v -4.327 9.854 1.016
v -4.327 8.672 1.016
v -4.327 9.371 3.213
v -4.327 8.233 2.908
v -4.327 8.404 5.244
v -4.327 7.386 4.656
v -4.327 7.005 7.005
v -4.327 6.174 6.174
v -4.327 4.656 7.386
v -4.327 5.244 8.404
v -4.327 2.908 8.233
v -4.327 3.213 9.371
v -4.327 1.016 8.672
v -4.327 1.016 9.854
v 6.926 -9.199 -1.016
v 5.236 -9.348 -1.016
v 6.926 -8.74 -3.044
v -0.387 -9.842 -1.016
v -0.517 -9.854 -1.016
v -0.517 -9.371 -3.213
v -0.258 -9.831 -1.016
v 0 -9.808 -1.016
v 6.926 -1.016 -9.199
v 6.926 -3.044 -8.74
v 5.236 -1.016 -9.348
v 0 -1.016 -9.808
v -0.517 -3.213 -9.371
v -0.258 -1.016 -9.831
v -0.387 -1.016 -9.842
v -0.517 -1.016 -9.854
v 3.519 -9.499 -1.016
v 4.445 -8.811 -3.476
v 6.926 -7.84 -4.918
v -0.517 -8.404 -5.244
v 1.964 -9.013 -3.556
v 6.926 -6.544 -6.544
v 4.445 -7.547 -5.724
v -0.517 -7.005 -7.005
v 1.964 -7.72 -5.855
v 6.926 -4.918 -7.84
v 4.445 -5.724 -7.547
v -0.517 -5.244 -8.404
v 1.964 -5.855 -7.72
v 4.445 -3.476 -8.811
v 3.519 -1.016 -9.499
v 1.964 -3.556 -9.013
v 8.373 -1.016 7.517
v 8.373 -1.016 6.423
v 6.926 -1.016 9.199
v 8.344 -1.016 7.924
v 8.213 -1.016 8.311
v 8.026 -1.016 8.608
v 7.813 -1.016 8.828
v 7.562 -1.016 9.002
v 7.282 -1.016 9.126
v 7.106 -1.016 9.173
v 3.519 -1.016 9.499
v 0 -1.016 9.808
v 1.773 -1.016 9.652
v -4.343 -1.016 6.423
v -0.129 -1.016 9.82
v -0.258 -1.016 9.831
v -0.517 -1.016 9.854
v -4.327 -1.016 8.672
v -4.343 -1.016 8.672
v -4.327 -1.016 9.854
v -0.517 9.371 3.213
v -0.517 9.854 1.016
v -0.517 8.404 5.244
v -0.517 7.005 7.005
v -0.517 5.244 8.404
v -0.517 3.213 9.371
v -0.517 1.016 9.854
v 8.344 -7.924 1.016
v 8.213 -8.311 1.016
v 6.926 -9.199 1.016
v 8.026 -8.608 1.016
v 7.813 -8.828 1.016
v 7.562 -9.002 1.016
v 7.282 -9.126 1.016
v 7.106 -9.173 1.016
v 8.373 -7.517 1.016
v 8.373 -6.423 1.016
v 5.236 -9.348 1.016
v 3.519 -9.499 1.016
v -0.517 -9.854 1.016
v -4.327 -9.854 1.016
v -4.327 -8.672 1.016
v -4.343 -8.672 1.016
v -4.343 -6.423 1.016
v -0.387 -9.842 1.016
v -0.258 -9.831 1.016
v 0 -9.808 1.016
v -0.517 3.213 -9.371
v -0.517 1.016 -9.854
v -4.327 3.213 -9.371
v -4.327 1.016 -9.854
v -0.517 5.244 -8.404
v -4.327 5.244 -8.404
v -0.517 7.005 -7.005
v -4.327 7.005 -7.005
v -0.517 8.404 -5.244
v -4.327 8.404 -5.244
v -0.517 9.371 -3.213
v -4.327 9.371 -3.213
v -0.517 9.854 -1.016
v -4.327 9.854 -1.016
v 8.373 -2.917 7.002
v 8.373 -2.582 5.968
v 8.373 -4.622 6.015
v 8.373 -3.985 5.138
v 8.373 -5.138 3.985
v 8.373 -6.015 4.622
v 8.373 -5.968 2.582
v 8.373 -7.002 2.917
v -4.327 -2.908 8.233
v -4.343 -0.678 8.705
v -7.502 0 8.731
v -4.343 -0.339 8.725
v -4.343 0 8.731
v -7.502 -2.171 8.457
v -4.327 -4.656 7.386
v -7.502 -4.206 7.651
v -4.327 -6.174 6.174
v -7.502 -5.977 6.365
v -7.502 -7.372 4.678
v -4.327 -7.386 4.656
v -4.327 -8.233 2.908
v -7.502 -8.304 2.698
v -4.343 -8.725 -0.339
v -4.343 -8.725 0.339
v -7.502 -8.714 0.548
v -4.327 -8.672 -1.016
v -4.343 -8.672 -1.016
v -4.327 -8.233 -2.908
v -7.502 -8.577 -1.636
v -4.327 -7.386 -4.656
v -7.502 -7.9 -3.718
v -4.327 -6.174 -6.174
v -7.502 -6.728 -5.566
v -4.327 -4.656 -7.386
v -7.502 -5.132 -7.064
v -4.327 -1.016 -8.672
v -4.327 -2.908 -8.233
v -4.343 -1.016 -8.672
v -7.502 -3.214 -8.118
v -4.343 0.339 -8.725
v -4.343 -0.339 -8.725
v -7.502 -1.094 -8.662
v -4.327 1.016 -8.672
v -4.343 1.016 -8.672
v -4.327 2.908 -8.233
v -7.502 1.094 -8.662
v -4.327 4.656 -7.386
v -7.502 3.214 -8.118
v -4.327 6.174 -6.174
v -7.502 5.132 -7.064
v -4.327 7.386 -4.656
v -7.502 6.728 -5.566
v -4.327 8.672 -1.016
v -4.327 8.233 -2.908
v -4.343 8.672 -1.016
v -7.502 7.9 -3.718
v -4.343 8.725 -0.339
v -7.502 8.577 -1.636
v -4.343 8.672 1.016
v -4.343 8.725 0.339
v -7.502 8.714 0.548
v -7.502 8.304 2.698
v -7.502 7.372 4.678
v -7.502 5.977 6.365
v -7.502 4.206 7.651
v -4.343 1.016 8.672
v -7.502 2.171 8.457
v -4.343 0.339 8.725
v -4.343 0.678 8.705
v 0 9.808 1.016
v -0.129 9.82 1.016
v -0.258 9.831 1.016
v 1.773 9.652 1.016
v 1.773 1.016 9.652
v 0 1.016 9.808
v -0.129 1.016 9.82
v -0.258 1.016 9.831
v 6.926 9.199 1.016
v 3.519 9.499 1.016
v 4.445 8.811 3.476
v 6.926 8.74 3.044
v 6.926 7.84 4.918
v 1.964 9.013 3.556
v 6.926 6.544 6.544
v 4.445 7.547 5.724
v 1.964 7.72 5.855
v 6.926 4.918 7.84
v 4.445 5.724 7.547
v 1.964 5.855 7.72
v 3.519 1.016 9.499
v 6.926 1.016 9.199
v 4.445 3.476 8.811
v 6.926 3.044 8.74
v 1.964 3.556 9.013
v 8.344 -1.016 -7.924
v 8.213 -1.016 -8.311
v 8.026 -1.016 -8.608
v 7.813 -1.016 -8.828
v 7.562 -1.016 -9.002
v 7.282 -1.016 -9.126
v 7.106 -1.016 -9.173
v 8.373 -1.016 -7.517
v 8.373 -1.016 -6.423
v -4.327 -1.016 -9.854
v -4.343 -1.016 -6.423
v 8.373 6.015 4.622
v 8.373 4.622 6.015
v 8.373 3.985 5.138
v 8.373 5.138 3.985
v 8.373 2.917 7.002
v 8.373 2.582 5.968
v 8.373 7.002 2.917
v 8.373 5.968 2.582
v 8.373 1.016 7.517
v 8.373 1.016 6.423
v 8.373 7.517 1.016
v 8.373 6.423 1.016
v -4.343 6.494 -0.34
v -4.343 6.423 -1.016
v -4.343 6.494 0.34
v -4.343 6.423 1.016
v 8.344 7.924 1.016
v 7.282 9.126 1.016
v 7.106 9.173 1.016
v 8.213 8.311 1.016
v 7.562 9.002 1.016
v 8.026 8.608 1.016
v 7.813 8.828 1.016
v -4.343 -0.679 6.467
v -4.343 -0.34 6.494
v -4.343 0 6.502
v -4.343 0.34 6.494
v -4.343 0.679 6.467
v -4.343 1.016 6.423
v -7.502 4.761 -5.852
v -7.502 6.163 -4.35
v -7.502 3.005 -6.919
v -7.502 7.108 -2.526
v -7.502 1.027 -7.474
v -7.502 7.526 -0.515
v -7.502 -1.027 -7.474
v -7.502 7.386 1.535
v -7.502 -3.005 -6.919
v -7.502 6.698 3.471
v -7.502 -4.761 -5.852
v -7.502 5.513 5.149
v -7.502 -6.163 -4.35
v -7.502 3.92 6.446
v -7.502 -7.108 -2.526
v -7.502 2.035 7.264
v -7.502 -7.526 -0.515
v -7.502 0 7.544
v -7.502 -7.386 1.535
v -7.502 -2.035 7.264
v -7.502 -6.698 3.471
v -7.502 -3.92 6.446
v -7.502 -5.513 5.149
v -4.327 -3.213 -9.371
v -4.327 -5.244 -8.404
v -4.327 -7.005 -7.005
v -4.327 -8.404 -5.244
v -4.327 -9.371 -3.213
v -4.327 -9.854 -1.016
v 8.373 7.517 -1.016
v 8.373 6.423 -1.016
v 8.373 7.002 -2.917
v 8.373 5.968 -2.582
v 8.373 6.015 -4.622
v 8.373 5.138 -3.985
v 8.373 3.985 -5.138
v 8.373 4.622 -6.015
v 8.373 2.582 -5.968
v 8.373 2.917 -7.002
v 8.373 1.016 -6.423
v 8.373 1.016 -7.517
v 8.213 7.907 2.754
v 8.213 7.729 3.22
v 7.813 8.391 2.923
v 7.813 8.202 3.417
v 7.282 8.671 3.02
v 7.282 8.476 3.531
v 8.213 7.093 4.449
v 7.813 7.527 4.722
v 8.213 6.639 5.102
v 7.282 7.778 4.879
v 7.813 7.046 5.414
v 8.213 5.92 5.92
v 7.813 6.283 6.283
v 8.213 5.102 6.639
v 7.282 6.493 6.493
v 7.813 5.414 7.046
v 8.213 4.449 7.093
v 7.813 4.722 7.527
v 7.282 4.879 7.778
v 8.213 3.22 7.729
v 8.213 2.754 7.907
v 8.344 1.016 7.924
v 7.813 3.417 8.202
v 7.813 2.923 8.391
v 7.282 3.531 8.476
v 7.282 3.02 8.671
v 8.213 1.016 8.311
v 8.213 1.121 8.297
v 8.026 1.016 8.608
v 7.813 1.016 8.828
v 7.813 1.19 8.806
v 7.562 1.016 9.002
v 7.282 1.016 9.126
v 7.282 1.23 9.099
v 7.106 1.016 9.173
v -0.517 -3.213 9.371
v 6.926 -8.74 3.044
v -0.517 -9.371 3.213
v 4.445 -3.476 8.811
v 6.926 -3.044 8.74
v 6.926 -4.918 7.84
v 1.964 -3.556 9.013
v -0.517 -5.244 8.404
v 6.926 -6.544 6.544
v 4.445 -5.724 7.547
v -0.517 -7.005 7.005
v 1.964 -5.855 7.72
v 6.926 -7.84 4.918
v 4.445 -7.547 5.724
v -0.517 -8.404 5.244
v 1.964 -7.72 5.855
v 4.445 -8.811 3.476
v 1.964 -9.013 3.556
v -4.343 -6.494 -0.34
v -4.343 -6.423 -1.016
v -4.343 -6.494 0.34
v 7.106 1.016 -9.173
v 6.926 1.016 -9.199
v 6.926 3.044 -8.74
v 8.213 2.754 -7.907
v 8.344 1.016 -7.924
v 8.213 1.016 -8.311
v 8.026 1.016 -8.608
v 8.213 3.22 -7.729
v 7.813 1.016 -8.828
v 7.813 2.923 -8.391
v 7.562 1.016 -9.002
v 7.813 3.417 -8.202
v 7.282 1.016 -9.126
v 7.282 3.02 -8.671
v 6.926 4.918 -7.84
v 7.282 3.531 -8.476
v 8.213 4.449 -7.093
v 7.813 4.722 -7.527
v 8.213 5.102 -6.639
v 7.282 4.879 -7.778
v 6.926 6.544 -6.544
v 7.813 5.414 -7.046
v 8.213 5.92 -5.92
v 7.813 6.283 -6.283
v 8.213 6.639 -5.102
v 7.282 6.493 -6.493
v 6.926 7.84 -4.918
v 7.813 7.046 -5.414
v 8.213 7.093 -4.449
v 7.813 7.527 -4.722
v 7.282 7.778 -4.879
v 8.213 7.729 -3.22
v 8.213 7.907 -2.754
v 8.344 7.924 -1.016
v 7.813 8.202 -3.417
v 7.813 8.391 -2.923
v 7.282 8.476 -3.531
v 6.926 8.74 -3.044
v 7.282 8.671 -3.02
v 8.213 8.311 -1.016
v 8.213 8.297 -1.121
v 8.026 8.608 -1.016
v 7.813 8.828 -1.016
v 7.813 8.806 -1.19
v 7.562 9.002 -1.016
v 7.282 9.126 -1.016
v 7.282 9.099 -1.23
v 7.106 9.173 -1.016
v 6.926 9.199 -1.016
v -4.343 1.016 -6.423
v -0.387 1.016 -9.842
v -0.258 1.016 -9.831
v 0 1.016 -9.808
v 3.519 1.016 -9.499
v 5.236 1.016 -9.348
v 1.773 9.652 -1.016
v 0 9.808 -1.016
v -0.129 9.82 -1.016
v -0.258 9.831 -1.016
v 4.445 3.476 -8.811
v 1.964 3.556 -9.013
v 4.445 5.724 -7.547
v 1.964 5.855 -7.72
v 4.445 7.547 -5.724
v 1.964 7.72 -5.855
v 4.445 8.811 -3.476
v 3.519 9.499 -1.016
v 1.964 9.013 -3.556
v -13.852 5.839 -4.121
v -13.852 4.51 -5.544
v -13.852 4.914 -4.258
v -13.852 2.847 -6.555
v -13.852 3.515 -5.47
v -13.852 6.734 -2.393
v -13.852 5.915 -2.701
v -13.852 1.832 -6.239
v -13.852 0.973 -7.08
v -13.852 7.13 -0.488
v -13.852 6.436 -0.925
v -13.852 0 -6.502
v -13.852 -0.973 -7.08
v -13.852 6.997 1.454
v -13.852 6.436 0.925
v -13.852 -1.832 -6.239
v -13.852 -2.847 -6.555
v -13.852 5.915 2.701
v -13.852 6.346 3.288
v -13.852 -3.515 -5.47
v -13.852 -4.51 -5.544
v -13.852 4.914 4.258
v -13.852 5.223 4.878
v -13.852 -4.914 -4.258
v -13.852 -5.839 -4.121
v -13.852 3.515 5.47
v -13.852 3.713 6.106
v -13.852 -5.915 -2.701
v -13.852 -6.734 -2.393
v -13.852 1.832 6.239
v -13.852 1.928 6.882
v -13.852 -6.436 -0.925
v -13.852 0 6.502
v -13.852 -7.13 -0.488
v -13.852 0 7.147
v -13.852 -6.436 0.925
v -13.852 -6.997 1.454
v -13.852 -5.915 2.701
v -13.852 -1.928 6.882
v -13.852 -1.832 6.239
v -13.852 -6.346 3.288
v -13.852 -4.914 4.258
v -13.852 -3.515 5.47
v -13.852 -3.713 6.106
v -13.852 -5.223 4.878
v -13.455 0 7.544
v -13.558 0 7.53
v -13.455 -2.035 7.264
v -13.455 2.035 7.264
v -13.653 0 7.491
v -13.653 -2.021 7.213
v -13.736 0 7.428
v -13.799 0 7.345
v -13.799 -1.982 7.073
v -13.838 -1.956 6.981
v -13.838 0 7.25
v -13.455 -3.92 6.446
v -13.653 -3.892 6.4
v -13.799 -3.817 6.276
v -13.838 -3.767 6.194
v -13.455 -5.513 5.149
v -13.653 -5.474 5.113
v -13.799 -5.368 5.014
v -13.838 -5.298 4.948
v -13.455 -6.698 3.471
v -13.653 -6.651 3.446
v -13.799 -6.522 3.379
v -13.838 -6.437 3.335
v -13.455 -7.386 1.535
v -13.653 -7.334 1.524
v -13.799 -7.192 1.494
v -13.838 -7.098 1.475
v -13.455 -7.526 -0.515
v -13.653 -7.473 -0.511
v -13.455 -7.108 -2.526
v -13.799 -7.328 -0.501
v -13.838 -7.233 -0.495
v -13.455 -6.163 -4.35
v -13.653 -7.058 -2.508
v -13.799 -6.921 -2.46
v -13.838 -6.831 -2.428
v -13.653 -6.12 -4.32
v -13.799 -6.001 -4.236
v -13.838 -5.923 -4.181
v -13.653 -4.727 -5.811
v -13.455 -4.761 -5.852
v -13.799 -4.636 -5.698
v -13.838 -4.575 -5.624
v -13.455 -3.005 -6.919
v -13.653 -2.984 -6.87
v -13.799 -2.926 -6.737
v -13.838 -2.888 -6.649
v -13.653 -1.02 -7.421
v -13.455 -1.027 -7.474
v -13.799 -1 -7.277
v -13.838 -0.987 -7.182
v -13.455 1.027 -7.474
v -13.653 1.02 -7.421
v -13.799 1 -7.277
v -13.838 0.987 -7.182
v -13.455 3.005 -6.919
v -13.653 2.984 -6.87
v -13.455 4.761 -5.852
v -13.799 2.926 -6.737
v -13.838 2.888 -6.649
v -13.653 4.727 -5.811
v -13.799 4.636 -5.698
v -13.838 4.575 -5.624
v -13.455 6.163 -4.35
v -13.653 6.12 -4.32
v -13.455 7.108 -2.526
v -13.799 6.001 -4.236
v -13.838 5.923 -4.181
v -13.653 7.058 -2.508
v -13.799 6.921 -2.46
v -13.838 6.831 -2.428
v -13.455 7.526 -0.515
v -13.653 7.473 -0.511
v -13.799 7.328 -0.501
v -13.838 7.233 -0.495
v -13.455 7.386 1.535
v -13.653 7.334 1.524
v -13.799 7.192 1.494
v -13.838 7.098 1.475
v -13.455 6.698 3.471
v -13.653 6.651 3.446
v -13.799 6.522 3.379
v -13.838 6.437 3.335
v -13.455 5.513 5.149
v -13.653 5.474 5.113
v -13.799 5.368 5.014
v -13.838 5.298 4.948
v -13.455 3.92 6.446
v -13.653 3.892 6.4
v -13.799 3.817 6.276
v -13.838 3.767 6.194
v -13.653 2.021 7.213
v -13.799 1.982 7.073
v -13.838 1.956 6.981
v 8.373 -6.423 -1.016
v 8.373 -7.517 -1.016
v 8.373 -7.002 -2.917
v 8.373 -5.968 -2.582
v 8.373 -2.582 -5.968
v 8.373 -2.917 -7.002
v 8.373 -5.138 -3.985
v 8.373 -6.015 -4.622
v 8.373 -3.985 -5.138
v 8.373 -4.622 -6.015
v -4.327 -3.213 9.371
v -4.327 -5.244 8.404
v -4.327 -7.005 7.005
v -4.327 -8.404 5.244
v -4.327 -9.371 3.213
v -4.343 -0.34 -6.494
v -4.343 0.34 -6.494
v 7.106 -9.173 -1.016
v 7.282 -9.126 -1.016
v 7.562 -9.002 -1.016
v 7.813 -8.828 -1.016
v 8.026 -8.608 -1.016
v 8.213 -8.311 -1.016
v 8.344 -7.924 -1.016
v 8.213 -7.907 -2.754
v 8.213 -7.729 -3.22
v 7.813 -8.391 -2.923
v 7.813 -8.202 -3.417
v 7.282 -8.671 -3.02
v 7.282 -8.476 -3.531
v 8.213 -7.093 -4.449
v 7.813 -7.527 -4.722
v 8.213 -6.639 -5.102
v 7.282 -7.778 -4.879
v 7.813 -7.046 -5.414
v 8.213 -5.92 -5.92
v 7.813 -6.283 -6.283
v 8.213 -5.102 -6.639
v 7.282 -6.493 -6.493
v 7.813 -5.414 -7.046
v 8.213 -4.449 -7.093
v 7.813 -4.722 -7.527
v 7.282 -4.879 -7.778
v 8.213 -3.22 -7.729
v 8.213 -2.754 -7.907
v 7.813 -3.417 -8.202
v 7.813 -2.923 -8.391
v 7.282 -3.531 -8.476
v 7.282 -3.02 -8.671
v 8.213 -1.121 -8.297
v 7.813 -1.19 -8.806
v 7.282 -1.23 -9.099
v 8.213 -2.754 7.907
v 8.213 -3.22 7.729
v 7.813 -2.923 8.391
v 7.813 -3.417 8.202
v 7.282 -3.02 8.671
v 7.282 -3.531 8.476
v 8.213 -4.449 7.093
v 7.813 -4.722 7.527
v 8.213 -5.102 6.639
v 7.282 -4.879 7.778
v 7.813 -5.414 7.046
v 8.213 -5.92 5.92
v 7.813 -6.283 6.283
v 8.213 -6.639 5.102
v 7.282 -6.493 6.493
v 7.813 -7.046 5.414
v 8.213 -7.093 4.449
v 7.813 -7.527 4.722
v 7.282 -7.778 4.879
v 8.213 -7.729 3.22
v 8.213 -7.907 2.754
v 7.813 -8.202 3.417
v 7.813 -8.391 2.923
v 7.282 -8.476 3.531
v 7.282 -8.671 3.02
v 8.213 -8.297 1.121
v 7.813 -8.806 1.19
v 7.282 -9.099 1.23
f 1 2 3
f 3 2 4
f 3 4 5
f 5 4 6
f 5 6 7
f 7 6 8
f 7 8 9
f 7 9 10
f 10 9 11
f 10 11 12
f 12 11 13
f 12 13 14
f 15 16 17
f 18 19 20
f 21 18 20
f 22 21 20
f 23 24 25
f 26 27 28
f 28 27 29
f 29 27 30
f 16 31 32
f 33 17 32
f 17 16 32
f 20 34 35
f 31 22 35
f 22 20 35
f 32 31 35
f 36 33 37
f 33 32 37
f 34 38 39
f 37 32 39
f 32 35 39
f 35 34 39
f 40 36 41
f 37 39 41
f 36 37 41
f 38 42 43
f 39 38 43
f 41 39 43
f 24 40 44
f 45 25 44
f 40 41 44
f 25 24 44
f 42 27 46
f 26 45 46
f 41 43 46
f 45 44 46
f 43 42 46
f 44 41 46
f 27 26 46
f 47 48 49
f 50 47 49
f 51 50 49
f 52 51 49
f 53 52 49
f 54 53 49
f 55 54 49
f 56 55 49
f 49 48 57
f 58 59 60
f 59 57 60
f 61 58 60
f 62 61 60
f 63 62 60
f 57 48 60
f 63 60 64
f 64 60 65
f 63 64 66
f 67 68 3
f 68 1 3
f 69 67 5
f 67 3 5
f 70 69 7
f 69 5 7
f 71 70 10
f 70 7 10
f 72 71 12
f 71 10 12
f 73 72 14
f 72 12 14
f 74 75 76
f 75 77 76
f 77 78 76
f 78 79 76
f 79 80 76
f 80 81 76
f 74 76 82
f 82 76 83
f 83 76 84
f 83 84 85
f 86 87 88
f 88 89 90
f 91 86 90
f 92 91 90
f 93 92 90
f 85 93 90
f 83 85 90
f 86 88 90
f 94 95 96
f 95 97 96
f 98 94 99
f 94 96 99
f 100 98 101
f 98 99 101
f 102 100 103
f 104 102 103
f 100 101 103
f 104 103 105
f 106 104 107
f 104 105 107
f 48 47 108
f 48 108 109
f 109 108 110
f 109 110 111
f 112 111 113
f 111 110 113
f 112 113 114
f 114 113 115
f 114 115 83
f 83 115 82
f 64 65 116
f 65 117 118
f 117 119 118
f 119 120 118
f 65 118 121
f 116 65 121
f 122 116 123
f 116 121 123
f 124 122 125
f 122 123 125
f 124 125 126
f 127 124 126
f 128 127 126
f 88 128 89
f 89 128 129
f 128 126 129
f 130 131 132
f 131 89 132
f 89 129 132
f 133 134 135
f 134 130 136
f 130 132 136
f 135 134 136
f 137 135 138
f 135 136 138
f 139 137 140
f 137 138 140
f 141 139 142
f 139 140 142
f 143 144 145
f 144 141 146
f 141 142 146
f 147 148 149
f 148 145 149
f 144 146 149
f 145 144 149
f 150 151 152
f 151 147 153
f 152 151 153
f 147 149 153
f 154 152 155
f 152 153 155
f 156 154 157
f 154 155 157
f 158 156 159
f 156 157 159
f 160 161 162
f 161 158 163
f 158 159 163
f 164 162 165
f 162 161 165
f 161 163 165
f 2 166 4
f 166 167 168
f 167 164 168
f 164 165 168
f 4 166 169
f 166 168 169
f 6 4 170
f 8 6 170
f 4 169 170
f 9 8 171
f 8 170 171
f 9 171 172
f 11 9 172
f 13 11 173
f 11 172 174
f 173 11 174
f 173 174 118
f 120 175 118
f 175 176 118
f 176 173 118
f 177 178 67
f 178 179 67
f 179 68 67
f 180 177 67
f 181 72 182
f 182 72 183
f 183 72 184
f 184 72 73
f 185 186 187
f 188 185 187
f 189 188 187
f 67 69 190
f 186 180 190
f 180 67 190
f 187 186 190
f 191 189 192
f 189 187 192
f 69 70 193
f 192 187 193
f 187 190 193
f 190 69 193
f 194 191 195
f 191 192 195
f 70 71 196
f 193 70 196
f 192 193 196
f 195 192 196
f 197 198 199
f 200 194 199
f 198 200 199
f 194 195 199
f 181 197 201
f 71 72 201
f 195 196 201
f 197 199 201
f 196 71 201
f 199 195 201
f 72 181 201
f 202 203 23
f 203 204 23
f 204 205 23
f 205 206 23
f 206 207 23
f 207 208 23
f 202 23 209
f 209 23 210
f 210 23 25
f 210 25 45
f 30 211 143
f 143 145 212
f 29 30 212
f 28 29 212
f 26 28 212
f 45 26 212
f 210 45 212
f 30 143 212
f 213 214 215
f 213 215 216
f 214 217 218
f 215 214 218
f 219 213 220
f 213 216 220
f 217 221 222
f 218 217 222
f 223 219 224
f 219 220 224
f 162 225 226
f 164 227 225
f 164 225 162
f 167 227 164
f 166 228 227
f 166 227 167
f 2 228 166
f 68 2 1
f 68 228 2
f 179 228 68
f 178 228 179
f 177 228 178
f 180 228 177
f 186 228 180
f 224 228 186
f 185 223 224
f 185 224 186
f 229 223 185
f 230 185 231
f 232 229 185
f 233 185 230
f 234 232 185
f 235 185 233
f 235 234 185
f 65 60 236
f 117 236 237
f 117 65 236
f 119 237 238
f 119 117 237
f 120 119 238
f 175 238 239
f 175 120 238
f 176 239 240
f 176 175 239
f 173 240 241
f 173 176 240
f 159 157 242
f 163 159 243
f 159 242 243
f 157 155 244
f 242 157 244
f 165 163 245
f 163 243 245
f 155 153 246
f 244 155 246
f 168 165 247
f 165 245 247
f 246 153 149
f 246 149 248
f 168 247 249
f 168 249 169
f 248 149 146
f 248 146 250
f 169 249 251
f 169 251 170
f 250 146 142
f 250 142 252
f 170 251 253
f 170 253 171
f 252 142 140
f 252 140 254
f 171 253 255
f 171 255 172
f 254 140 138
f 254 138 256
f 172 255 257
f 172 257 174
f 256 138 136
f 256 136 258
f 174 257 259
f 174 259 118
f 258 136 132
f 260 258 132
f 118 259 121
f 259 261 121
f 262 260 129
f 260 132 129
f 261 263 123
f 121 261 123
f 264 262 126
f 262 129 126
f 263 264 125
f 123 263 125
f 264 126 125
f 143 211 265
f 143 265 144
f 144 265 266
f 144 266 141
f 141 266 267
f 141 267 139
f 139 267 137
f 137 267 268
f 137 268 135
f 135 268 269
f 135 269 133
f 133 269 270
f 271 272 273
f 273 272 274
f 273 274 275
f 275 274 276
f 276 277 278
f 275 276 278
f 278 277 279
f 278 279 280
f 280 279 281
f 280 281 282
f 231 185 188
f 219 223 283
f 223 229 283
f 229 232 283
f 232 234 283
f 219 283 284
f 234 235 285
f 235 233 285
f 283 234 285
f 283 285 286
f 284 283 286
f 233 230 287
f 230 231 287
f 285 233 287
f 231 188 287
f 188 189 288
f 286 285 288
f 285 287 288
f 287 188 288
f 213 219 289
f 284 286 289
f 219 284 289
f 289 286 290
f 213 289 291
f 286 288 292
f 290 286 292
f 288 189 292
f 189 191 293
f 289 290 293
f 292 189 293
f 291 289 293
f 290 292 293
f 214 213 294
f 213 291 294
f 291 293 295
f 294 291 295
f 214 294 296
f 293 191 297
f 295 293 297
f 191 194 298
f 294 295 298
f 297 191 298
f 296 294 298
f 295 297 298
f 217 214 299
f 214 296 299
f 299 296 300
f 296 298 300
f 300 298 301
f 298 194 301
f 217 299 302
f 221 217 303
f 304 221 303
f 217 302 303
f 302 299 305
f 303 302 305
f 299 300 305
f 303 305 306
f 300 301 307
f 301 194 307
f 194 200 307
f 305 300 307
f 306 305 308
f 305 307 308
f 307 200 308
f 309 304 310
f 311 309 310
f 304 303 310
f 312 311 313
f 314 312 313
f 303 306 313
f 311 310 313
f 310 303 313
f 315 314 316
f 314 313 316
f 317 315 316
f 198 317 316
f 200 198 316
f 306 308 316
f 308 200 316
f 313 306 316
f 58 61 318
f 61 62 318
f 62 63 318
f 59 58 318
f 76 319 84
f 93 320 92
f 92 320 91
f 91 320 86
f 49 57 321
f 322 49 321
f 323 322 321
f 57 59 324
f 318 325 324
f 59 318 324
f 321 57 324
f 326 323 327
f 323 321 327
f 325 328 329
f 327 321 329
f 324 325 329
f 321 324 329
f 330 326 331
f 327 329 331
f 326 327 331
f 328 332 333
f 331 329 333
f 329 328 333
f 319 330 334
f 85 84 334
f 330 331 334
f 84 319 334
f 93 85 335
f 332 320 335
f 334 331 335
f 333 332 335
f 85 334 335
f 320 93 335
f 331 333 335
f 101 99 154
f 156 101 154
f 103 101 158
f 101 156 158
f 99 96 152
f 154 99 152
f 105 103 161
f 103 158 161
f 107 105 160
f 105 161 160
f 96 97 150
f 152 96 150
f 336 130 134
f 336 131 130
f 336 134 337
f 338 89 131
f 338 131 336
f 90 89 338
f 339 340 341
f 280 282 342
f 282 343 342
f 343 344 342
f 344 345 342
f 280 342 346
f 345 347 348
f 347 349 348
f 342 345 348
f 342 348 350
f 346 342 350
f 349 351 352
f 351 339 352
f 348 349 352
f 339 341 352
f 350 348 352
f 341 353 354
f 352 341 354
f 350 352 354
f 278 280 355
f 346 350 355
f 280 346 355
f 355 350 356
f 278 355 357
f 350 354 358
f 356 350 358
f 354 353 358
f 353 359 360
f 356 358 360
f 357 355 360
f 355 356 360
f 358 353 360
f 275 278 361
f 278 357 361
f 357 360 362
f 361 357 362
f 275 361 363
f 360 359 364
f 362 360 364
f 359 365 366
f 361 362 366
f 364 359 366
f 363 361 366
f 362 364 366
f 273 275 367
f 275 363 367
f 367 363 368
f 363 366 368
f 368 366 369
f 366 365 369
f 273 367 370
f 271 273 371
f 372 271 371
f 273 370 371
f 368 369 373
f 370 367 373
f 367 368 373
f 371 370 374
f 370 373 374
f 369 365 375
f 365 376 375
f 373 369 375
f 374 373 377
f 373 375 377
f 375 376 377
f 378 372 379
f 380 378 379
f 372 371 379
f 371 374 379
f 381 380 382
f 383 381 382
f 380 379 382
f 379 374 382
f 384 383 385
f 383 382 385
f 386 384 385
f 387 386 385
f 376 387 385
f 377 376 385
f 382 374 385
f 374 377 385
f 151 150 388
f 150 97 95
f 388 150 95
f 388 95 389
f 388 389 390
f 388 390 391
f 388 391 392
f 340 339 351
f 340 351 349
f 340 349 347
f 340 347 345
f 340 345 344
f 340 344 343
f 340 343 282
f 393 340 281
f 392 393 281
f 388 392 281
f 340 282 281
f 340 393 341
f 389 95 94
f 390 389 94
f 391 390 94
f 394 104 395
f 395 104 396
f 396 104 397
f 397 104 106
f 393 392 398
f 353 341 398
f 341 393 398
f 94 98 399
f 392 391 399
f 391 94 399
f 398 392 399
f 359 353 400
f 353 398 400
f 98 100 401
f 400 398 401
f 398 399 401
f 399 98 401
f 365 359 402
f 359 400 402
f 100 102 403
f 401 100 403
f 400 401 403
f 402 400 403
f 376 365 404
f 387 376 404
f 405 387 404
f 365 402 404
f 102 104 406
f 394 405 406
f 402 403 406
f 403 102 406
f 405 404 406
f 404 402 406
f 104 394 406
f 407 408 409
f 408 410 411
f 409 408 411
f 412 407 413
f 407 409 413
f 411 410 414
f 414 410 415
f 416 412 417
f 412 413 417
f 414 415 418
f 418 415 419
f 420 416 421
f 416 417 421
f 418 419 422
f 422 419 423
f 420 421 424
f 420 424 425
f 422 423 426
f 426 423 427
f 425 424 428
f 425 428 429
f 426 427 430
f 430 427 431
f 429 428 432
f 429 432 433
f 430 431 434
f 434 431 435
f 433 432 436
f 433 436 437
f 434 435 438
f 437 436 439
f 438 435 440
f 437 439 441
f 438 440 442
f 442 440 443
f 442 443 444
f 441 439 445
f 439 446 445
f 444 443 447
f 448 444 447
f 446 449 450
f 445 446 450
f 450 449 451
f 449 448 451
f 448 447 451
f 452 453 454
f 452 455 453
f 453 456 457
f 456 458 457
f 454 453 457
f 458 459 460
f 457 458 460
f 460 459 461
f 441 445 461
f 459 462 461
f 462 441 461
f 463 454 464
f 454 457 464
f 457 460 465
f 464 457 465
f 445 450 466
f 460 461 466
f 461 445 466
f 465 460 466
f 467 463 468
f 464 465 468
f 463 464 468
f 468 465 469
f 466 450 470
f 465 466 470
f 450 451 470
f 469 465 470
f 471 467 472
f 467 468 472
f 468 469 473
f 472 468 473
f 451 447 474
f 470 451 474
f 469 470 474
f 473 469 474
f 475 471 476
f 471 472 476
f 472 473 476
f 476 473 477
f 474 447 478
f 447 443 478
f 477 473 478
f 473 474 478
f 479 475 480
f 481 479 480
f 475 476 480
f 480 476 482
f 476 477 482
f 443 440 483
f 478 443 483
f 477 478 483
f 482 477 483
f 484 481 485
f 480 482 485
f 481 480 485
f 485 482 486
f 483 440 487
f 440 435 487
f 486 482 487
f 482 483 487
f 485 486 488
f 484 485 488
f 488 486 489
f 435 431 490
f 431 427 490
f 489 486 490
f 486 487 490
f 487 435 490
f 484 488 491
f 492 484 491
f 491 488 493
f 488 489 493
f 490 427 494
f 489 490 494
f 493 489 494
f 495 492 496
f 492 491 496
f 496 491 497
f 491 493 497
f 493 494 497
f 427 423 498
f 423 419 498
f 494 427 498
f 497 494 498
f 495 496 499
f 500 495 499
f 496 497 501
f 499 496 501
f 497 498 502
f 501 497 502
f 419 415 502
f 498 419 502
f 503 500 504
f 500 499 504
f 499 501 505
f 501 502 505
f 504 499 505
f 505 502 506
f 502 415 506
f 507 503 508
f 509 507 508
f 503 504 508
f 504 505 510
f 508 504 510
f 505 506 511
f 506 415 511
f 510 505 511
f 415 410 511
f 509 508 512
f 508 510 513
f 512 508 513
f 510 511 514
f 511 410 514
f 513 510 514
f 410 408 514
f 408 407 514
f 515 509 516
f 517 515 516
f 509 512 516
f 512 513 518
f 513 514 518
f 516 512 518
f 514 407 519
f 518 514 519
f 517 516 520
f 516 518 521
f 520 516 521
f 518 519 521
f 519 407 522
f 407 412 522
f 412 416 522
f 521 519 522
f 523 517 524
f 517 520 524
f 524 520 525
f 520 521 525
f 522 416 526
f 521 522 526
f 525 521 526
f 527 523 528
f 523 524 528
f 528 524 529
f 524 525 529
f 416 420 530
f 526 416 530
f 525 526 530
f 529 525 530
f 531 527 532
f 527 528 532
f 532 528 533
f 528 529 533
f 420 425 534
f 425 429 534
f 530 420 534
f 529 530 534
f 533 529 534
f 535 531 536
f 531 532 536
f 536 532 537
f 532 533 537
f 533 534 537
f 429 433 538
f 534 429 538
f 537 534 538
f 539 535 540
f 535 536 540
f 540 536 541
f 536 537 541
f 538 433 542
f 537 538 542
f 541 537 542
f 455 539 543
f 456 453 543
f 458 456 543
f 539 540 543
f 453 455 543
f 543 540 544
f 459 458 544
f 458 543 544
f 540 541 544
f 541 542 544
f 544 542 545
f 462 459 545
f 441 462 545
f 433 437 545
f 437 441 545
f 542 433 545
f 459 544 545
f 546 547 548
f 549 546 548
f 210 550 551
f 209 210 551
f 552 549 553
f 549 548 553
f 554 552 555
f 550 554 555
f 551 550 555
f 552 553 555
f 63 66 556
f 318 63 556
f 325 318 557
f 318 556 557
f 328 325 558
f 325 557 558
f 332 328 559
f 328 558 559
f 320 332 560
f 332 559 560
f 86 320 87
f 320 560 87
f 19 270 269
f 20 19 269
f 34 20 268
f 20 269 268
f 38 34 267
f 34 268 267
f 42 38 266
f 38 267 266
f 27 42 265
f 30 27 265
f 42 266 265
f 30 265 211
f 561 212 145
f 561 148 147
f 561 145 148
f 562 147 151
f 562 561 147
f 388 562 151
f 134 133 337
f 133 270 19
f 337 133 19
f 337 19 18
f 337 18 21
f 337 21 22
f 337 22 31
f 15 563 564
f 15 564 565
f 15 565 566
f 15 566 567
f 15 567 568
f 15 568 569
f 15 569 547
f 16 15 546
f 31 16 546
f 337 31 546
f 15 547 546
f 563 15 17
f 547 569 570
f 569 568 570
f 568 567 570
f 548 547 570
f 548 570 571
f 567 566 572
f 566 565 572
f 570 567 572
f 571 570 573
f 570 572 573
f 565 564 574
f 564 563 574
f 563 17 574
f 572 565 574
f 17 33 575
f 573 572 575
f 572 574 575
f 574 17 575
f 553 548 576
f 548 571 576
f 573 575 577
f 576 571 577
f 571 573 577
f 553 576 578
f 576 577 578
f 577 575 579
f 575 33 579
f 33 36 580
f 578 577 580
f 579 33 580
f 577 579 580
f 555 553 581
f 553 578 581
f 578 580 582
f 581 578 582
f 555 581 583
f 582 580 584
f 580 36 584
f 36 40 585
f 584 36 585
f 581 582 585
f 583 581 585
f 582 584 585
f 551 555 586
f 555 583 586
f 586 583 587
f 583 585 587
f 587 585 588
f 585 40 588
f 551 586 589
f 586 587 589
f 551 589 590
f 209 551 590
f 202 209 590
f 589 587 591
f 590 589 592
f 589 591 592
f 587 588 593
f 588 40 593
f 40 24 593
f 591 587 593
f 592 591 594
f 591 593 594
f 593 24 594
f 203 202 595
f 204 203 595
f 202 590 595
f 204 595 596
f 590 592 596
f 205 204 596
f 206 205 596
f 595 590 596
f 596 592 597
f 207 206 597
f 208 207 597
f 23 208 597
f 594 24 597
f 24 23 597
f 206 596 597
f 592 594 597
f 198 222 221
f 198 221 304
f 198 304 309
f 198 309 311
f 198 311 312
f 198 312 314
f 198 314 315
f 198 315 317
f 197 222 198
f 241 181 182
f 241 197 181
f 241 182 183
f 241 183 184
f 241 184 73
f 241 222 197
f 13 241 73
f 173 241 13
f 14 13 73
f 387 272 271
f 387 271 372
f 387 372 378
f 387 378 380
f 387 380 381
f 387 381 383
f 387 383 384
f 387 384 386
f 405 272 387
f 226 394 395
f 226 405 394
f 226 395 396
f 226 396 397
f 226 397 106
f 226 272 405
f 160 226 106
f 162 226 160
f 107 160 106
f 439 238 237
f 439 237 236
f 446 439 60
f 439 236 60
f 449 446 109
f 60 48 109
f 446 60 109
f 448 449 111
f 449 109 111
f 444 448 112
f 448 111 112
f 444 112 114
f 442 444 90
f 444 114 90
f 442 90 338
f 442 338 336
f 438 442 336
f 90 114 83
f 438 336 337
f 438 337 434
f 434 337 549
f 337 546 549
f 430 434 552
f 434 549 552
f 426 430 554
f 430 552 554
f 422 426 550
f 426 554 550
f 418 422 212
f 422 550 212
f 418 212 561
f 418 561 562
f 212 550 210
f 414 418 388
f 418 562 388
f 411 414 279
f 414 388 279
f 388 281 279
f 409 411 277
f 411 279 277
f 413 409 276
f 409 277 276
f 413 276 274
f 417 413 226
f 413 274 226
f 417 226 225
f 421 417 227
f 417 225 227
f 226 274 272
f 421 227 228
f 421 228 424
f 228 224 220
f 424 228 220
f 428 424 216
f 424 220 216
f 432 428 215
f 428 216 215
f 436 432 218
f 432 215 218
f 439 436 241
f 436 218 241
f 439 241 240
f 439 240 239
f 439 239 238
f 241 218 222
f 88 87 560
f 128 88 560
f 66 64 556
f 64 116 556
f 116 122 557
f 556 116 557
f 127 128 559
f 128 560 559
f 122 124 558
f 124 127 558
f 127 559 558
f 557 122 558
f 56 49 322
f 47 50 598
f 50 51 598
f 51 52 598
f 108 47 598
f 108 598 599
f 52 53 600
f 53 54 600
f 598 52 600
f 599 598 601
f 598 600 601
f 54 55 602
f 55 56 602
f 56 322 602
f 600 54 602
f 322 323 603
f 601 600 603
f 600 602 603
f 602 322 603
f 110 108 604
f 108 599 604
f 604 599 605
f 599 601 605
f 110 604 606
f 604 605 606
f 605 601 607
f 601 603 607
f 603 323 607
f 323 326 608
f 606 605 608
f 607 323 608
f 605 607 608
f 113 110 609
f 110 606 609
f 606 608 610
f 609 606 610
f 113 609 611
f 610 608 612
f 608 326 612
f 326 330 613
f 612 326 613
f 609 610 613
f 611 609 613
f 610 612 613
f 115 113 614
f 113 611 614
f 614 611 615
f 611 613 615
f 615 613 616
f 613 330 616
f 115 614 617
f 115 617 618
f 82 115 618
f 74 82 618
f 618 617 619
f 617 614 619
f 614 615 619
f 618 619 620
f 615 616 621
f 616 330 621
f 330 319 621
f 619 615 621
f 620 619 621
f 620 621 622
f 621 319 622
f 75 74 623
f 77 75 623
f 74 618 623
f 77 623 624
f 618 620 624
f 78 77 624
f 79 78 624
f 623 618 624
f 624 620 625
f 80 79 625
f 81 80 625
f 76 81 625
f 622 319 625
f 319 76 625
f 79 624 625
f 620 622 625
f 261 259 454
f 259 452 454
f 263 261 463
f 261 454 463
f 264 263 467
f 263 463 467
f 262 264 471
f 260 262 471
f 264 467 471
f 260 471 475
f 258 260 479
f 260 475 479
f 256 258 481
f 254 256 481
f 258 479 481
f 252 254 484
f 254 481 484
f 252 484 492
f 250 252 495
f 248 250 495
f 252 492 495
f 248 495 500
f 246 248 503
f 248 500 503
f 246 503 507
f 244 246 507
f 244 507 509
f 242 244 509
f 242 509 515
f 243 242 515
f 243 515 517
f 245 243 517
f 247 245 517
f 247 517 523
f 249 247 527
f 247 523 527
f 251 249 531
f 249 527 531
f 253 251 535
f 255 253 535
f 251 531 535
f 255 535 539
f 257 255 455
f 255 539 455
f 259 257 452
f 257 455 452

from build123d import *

# Parameters (mm, degrees)
F2_W          = 2.032
F2_H          = 3.556
F2_W_2        = 3.556
F2_H_2        = 2.032
F3_DEPTH      = 25.4
F3_DEPTH_BACK = 4.3434


# Not quite as in the source:
# - a feature names something its author has since deleted; it is built from what else it names


with BuildPart() as f1:
    # F0 (on Front) → F1 (revolve)
    with BuildSketch(Plane.XZ):
        with BuildLine():
            ThreePointArc((8.3732076521, 7.5855466623), (7.9877835669, 8.7130510839), (6.9264967271, 9.2547965866))
            Line((6.9264967271, 9.2547965866), (-0.5167923479, 9.906))
            Line((-0.5167923479, 9.906), (-4.3267923479, 9.906))
            Line((-4.3267923479, 9.906), (-4.3267923479, 8.73125))
            Line((-4.3267923479, 8.73125), (-7.5017923479, 8.73125))
            Line((-7.5017923479, 8.73125), (-7.5017923479, 7.5438))
            Line((-7.5017923479, 7.5438), (-13.4549173479, 7.5438))
            ThreePointArc((-13.4549173479, 7.5438), (-13.7355503517, 7.4275580038), (-13.8517923479, 7.146925))
            Line((-13.8517923479, 7.146925), (-13.8517923479, 6.5024))
            Line((-13.8517923479, 6.5024), (8.3732076521, 6.5024))
            Line((8.3732076521, 6.5024), (8.3732076521, 7.5855466623))
        make_face()
    revolve(axis=Axis((-0.2325048039, 0, 0), (1, 0, 0)))

    # F2 (on Right) → F3 (cut, two sides)
    with BuildSketch(Plane.YZ) as f3_sk:
        with Locations((0, -8.1534)):
            Rectangle(F2_W, F2_H)
        with Locations((0, 8.1534)):
            Rectangle(F2_W, F2_H)
        with Locations((-8.1534, 0)):
            Rectangle(F2_W_2, F2_H_2)
        with Locations((8.1534, 0)):
            Rectangle(F2_W_2, F2_H_2)
    extrude(amount=F3_DEPTH, mode=Mode.SUBTRACT)
    extrude(f3_sk.sketch, amount=-F3_DEPTH_BACK, mode=Mode.SUBTRACT)


solid = f1.part
